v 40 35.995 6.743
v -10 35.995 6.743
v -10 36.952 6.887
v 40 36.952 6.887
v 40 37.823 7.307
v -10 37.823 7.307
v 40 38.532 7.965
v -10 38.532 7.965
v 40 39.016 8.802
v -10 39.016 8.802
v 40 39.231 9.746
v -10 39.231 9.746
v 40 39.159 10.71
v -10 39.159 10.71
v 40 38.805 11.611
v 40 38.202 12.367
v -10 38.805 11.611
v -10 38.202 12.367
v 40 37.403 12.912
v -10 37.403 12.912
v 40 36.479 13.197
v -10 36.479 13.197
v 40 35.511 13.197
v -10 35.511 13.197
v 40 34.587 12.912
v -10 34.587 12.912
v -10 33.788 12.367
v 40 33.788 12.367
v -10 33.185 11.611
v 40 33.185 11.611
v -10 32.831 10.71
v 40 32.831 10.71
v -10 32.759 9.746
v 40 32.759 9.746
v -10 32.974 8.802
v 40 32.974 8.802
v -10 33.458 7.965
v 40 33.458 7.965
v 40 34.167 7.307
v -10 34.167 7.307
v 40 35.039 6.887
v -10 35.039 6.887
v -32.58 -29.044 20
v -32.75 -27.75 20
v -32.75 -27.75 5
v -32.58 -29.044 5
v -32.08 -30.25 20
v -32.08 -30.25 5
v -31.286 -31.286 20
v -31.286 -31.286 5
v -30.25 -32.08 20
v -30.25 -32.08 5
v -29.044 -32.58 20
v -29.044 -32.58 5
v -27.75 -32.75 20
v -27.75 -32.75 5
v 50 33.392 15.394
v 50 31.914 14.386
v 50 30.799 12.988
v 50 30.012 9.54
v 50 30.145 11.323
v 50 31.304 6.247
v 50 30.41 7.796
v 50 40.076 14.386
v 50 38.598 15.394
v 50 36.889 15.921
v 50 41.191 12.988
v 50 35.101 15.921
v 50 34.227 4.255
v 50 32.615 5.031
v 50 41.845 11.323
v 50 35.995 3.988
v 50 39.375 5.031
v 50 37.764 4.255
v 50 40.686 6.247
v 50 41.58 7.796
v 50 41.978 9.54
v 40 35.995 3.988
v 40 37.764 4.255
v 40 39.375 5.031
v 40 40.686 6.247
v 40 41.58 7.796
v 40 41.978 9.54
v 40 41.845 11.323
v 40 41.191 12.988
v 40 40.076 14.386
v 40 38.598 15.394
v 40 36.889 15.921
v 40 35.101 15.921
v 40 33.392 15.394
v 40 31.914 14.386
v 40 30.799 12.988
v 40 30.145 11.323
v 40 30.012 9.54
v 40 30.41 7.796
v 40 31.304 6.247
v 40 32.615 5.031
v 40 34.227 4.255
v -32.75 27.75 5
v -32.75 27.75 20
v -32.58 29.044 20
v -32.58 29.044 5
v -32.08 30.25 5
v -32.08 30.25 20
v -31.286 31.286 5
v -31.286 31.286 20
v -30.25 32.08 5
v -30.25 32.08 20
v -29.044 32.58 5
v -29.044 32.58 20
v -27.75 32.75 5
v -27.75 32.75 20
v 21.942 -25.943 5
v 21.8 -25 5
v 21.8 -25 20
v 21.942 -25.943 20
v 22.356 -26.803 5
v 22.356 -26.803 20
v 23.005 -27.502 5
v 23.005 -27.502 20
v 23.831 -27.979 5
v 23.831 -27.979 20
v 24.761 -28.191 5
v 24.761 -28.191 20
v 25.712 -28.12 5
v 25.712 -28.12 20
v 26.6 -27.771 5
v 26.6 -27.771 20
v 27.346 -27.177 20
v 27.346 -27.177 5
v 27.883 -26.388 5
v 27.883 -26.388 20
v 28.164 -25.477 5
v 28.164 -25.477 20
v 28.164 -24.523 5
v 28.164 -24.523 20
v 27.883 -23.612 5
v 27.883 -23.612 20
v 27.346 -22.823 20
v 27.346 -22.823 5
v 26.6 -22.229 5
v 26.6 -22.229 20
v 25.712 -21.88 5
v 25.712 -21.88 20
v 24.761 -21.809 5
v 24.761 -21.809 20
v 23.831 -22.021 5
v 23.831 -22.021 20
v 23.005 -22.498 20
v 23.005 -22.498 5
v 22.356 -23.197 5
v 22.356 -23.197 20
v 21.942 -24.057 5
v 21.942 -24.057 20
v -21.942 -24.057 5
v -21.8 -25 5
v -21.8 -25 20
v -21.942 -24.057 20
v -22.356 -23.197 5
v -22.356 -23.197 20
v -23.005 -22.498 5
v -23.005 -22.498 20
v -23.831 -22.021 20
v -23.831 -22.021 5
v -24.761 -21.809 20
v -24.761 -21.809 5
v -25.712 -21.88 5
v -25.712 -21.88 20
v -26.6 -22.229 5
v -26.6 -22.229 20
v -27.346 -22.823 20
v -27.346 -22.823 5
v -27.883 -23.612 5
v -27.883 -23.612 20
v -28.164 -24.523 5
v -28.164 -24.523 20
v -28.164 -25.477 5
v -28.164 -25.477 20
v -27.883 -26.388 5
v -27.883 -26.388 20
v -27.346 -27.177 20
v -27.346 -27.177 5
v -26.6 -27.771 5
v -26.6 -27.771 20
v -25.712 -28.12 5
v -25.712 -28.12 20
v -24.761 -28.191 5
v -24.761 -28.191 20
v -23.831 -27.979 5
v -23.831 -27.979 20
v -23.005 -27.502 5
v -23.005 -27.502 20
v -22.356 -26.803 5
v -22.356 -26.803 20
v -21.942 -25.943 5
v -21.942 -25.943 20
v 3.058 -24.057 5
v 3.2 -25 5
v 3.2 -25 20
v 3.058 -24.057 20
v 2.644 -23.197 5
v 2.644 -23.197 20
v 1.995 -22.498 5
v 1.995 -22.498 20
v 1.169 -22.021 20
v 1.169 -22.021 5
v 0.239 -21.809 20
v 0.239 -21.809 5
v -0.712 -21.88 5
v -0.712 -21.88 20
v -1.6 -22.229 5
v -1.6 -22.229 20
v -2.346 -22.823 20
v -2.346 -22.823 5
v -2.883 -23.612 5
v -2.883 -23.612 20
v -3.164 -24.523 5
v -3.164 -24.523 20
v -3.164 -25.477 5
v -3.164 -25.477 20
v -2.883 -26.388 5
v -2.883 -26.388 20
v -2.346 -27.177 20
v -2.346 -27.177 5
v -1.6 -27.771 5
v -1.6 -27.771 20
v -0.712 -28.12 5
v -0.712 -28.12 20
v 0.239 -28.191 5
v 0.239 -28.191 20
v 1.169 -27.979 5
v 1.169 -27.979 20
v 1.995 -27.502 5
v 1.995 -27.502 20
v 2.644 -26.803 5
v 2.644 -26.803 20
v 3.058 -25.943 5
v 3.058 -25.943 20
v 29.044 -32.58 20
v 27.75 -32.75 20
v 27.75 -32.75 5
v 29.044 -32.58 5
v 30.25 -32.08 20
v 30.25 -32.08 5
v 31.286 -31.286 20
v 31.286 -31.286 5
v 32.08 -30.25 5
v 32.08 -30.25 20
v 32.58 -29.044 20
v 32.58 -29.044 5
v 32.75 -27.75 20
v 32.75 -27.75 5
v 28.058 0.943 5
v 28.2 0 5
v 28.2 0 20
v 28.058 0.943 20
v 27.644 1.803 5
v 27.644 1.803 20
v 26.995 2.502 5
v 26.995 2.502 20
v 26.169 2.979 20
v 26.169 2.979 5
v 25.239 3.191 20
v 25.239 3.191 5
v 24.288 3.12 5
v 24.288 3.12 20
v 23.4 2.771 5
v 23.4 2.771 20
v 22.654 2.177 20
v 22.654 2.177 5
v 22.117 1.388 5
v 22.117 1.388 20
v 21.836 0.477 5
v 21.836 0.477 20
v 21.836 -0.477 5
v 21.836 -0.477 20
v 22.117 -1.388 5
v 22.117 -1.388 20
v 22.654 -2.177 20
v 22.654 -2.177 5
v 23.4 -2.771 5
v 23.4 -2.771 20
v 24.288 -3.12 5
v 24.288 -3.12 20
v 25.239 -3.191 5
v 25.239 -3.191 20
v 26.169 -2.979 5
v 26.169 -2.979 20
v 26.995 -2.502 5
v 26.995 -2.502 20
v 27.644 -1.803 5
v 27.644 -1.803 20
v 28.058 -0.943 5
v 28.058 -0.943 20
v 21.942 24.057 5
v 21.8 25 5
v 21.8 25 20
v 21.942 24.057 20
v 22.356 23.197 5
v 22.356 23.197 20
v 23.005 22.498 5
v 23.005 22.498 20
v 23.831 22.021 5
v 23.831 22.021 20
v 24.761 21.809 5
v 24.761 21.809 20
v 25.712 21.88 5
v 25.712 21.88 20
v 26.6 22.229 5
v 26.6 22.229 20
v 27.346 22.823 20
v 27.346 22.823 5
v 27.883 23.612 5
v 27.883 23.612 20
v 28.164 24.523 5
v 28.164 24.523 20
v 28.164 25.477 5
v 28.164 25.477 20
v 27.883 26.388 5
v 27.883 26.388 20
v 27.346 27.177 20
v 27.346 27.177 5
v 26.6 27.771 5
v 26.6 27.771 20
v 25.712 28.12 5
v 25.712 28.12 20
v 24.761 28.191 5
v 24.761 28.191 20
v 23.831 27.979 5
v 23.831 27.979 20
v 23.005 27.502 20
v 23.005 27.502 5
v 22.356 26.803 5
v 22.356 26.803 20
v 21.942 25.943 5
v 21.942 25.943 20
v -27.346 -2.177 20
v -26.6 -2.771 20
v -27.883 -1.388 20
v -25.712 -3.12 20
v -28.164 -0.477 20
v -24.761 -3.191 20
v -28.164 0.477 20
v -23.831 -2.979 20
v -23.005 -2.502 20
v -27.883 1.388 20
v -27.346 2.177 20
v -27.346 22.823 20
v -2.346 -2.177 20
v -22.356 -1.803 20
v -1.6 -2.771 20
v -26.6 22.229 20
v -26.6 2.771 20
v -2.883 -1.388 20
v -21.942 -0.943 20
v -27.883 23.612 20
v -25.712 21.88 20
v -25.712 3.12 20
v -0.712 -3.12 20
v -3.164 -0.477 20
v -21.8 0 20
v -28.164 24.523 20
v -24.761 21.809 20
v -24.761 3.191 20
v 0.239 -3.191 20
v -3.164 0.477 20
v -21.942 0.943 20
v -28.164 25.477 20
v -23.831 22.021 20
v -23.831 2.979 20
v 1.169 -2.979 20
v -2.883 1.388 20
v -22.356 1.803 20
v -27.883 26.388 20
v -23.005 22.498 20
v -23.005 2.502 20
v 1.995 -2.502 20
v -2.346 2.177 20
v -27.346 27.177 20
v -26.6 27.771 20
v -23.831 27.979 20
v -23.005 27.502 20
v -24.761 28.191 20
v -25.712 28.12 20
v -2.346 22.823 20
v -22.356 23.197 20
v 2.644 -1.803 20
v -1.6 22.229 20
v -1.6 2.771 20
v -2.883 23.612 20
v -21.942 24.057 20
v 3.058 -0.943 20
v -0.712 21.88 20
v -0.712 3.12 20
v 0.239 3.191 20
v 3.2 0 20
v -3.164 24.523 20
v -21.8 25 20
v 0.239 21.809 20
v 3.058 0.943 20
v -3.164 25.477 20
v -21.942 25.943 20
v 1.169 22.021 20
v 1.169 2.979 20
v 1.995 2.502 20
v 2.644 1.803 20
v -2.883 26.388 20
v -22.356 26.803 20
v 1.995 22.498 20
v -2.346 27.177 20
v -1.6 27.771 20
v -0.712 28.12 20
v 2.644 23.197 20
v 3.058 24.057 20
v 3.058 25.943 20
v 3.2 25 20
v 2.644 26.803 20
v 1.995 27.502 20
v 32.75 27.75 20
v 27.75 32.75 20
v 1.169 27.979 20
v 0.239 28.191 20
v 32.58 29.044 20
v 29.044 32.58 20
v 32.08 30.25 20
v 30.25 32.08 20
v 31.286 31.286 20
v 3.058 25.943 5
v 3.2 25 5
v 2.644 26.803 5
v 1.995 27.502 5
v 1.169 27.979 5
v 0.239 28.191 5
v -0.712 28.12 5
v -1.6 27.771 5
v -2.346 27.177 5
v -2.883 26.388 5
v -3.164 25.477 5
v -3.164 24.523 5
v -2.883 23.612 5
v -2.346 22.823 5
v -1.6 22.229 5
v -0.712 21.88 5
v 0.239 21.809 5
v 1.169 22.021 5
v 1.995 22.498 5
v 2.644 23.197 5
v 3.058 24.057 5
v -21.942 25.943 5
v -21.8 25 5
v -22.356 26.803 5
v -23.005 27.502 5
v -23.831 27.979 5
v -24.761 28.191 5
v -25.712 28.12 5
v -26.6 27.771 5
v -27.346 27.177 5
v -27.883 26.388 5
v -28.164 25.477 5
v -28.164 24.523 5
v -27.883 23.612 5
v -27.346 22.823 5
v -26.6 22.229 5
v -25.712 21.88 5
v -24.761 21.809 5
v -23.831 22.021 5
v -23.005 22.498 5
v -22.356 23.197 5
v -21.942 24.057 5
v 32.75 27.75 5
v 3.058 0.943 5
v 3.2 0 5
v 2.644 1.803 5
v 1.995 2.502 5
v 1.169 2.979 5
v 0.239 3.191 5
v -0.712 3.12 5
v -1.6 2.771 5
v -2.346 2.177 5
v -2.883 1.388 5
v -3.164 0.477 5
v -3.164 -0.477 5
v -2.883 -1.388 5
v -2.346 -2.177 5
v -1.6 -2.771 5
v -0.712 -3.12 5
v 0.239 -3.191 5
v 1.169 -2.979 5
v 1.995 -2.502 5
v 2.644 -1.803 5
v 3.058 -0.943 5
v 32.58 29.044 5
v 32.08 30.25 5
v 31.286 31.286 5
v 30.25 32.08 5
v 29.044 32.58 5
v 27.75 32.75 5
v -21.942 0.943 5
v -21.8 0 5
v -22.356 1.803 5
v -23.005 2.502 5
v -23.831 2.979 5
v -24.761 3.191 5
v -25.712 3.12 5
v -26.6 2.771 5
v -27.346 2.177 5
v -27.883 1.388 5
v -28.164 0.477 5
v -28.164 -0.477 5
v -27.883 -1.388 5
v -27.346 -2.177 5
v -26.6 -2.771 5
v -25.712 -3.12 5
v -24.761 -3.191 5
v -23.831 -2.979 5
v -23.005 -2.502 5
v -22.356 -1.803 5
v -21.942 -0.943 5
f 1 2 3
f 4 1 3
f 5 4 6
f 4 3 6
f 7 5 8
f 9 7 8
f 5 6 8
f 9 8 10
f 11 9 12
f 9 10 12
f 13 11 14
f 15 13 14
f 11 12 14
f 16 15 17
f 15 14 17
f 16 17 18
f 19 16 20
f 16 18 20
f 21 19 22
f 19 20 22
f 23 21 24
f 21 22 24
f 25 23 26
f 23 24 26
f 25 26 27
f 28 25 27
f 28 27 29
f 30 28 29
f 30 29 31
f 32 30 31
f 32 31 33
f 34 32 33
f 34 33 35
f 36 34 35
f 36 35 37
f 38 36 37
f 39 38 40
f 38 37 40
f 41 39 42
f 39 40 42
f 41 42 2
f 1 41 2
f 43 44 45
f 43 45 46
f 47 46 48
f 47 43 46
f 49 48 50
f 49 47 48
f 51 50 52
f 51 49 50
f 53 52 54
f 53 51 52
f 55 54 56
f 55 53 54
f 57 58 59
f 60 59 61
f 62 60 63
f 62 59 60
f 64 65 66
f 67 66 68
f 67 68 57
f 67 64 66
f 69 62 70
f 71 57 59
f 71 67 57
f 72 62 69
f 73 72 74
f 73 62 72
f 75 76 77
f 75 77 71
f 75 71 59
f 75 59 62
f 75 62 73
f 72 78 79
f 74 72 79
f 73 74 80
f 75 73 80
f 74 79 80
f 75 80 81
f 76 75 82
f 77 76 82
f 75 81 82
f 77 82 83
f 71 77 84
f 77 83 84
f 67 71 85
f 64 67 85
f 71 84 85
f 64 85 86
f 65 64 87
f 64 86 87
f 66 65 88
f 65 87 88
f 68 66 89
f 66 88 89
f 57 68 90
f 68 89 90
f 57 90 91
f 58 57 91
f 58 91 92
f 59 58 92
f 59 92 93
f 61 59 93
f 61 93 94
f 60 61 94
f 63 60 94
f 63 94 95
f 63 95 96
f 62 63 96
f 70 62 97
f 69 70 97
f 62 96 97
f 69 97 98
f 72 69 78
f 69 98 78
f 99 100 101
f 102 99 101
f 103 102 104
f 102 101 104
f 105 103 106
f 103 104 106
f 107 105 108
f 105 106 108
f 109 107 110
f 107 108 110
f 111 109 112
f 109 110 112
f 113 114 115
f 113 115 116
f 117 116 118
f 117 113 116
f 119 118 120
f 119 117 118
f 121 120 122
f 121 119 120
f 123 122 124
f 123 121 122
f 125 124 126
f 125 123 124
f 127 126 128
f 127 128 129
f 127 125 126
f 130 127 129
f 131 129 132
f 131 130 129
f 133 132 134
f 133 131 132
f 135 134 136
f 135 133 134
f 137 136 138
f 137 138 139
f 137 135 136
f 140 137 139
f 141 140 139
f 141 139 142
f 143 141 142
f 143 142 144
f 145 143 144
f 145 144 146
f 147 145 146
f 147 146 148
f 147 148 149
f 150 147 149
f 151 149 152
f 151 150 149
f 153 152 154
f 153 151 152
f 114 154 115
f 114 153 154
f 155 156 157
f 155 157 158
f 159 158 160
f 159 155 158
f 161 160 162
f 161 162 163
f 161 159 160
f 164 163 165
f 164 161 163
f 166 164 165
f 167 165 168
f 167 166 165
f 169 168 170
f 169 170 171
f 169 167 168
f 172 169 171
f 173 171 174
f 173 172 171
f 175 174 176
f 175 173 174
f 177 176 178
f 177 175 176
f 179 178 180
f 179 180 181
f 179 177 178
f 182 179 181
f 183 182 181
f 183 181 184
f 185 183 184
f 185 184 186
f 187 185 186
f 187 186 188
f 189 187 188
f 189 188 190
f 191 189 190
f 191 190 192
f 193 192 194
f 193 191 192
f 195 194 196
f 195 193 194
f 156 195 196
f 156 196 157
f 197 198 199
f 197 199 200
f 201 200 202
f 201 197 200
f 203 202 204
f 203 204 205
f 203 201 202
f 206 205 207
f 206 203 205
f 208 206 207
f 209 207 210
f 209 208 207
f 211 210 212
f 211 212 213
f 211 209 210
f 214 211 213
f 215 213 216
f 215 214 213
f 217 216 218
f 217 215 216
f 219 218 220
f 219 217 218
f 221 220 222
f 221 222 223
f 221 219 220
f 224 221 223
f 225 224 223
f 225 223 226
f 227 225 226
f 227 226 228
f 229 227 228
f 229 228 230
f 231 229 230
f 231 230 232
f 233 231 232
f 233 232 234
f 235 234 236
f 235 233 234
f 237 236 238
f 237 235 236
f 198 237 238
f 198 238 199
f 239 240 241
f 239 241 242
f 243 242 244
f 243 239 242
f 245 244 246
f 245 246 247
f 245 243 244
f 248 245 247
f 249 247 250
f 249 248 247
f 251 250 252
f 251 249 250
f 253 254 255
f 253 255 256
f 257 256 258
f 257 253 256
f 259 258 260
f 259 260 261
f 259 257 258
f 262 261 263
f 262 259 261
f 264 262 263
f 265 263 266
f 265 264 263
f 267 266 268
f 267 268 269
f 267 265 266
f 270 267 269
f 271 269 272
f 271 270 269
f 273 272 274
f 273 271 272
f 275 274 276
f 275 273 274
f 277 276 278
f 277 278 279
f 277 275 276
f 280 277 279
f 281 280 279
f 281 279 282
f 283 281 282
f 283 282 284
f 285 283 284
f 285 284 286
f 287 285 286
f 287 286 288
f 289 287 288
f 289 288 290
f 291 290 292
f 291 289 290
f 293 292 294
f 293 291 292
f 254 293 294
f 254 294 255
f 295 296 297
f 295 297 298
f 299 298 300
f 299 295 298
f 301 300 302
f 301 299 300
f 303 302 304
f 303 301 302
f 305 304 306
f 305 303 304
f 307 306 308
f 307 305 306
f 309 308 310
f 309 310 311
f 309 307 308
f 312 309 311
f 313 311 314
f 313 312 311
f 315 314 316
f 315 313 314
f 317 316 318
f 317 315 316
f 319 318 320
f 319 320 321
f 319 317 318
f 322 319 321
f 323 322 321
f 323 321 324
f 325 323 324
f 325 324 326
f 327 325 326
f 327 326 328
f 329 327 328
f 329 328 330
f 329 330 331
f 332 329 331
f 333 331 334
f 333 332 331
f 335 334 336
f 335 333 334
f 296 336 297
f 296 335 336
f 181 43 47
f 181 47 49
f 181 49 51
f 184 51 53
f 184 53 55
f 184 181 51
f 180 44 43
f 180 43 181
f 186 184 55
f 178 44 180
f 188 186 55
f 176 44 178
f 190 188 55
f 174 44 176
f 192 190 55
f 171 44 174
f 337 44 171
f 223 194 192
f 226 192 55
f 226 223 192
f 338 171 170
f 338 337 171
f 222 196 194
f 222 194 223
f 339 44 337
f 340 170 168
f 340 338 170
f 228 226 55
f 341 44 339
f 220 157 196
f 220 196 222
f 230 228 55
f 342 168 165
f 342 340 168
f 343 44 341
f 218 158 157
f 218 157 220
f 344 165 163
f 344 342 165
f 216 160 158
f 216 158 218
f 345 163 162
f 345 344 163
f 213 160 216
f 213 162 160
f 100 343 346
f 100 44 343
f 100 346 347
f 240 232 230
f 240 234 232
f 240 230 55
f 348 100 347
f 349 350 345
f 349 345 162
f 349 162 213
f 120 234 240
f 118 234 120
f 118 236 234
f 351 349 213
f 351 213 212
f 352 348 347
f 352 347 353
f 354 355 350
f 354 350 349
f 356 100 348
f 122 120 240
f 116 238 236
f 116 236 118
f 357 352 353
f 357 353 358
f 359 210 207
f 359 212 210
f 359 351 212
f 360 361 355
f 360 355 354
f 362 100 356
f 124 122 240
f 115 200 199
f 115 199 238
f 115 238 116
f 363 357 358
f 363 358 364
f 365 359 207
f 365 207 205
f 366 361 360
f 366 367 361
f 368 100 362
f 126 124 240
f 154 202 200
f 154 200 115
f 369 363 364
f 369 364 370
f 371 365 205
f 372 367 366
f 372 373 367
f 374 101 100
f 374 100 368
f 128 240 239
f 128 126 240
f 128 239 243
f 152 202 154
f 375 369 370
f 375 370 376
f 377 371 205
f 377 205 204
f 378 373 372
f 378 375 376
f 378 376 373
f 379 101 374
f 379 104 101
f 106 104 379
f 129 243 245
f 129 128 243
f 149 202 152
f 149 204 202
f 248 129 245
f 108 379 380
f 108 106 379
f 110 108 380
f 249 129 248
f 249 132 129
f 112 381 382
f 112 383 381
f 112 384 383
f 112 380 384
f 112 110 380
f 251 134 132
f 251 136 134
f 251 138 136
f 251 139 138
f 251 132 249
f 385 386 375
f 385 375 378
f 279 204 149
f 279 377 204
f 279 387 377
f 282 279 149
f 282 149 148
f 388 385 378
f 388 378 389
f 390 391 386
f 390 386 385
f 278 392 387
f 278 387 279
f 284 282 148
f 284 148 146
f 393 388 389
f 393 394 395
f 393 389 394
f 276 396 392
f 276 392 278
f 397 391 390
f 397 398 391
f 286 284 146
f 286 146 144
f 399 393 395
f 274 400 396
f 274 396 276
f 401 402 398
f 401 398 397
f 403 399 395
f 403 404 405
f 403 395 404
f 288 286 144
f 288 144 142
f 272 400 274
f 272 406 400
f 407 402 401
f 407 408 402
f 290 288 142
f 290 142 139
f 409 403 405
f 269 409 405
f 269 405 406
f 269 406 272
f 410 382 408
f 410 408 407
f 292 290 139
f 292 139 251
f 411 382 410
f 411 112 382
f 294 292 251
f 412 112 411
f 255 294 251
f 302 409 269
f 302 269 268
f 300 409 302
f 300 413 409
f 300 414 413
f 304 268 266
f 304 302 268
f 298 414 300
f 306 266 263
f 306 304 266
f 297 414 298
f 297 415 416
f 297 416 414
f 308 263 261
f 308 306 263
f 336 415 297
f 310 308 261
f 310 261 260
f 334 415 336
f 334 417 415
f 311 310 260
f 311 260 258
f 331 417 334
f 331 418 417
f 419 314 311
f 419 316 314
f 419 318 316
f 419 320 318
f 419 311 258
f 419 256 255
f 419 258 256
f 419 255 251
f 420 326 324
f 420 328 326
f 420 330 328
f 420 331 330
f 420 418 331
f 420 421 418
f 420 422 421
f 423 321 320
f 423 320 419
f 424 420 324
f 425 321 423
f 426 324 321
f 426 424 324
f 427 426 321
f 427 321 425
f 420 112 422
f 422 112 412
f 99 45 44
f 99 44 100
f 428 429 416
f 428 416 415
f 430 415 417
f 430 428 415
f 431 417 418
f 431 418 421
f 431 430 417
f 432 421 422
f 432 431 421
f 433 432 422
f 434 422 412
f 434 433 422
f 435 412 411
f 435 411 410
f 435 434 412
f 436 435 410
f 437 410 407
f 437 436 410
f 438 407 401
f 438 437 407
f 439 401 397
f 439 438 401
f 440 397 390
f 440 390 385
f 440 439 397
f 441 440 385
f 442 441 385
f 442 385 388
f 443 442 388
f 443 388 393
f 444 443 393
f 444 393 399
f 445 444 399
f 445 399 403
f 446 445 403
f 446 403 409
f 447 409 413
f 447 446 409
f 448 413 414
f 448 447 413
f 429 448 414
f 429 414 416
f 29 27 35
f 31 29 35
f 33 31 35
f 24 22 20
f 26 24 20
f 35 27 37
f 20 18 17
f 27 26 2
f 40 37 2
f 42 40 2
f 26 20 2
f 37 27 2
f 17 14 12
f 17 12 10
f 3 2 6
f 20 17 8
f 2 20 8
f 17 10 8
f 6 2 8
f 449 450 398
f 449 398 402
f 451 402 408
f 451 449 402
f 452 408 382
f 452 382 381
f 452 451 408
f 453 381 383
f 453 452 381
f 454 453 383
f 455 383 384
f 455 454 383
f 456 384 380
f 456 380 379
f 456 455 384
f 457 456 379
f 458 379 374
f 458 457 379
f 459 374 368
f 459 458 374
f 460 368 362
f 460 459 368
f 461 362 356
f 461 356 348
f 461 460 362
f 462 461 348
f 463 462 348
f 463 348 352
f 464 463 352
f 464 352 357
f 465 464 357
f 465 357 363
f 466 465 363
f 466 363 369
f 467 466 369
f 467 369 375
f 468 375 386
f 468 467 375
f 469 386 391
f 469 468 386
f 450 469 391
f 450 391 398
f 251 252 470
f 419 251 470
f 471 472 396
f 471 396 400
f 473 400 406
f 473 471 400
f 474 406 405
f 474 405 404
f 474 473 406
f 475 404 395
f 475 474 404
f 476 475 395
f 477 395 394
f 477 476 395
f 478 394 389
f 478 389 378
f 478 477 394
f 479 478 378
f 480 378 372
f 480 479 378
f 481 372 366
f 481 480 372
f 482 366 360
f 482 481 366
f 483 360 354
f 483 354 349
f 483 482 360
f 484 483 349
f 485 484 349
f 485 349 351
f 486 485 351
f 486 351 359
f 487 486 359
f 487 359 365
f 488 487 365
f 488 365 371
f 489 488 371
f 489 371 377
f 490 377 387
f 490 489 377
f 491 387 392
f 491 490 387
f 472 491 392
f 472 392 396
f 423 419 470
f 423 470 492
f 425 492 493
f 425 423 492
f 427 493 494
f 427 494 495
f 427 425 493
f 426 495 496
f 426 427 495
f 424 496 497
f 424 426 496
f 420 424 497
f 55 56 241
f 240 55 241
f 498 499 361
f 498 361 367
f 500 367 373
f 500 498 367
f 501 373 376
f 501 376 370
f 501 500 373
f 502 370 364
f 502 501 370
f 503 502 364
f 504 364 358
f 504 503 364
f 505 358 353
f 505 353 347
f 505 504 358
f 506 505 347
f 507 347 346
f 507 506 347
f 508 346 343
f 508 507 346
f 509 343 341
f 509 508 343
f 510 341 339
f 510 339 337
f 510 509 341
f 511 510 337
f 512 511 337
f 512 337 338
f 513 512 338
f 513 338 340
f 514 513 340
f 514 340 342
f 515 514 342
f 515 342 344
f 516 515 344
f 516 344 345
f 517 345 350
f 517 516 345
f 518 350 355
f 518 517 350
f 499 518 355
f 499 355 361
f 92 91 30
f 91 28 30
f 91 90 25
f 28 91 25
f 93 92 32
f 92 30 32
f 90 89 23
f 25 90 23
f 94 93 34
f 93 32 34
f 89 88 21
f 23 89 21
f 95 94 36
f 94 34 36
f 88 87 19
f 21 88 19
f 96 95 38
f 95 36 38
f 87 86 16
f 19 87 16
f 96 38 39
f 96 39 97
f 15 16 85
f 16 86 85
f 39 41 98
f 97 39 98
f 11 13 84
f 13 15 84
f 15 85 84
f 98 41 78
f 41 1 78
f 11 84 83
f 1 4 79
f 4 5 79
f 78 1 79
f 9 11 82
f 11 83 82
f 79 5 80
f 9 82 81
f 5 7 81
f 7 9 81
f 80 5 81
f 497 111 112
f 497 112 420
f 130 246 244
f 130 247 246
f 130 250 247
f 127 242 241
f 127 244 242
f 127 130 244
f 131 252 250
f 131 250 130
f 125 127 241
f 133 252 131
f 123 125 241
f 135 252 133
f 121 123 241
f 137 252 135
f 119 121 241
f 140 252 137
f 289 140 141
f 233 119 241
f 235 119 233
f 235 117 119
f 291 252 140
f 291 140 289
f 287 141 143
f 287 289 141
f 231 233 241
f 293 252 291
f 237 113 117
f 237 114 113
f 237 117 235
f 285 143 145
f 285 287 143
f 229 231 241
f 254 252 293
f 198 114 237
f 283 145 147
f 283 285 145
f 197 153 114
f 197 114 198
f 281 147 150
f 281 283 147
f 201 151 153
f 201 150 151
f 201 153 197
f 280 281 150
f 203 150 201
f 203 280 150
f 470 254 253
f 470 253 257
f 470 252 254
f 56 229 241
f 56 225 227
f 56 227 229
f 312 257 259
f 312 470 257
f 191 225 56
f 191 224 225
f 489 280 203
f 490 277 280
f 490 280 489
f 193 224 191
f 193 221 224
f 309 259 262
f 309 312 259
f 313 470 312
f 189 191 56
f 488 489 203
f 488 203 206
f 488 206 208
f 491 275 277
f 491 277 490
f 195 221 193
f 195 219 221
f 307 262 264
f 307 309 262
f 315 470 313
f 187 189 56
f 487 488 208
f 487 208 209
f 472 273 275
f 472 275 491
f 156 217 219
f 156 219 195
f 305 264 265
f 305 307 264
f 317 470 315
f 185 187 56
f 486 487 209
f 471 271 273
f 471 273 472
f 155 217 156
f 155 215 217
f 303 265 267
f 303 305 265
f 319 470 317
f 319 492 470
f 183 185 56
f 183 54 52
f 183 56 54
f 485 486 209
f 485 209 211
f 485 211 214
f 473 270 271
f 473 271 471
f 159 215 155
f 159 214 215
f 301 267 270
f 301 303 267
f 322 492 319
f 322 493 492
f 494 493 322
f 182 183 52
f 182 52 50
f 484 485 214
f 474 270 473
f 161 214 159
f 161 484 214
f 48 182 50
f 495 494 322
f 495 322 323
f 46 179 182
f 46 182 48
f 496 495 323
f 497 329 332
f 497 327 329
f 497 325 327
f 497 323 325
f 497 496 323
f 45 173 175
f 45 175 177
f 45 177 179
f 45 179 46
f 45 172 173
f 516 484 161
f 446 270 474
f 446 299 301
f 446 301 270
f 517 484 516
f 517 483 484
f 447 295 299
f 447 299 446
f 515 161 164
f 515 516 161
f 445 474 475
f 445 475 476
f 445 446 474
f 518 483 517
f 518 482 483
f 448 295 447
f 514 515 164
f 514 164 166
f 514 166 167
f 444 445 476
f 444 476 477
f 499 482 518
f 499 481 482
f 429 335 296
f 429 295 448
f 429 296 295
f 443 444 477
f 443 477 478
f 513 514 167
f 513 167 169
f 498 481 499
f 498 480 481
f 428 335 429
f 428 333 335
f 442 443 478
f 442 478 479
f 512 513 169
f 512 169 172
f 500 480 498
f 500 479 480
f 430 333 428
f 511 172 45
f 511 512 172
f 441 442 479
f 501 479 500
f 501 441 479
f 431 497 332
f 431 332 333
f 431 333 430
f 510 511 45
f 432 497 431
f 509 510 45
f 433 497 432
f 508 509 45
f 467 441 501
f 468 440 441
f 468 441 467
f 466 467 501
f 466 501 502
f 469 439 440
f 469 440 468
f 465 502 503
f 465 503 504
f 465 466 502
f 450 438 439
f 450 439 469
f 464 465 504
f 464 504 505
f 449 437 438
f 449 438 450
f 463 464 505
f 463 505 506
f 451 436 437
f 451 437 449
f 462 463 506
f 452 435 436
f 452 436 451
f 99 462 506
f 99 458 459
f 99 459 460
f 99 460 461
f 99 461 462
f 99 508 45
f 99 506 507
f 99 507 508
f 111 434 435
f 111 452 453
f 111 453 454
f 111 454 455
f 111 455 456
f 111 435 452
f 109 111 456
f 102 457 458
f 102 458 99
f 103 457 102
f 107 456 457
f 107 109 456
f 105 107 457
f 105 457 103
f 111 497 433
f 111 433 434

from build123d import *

# Parameters (mm, degrees)
SKETCH_1_W           = 65.5
SKETCH_1_H           = 65.5
EXTRUDE_1_DEPTH      = 20
FILLET_1_R           = 5
EXTRUDE_2_DEPTH      = 40
EXTRUDE_2_DEPTH_BACK = 10
SKETCH_5_R           = 3.245044742
SKETCH_6_R           = 6
EXTRUDE_3_DEPTH      = 10
SKETCH_7_R           = 3.2
CUT_EXTRUDE_2_DEPTH  = 5
CUT_EXTRUDE_START    = -15
SKETCH_3_R           = 3.2
CUT_EXTRUDE_3_DEPTH  = 15
SKETCH_9_W           = 65.5
SKETCH_9_H           = 65.5
CUT_EXTRUDE_5_DEPTH  = 5


with BuildPart() as part:
    # 스케치1 → 보스-돌출1 (new body)
    with BuildSketch(Plane.XY):
        Rectangle(SKETCH_1_W, SKETCH_1_H)
    extrude(amount=EXTRUDE_1_DEPTH)

    # 필렛1
    fillet_1_edges = [part.edges().sort_by_distance(p)[0] for p in [
        (-32.75, -32.75, 10),
        (32.75, -32.75, 10),
        (32.75, 32.75, 10),
        (-32.75, 32.75, 10),
    ]]
    fillet(fillet_1_edges, radius=FILLET_1_R)

    # 스케치7 → 컷-돌출2 (cut)
    with BuildSketch(Plane(origin=(0, 0, 0), x_dir=(-1, 0, 0), z_dir=(0, 0, -1))):
        with Locations((-25, -25)):
            Circle(SKETCH_7_R)
        with Locations((-25, 25)):
            Circle(SKETCH_7_R)
    extrude(amount=-CUT_EXTRUDE_2_DEPTH, mode=Mode.SUBTRACT)

    # 스케치3 → 컷-돌출3 (cut)
    with BuildSketch(Plane.XY.offset(20).offset(CUT_EXTRUDE_START)):
        with Locations(Location((25, -25, 0), (0, 0, 180))):
            Circle(SKETCH_3_R)
        with Locations(Location((25, 25, 0), (0, 0, 180))):
            Circle(SKETCH_3_R)
        with Locations((25, 0)):
            Circle(SKETCH_3_R)
        with Locations((0, -25)):
            Circle(SKETCH_3_R)
        with Locations((0, 25)):
            Circle(SKETCH_3_R)
        Circle(SKETCH_3_R)
        with Locations((-25, -25)):
            Circle(SKETCH_3_R)
        with Locations((-25, 25)):
            Circle(SKETCH_3_R)
        with Locations((-25, 0)):
            Circle(SKETCH_3_R)
    extrude(amount=CUT_EXTRUDE_3_DEPTH, mode=Mode.SUBTRACT)

    # 스케치9 → 컷-돌출5 (cut)
    with BuildSketch(Plane(origin=(0, 0, 0), x_dir=(-1, 0, 0), z_dir=(0, 0, -1))):
        Rectangle(SKETCH_9_W, SKETCH_9_H)
    extrude(amount=-CUT_EXTRUDE_5_DEPTH, mode=Mode.SUBTRACT)


with BuildPart() as body_2:
    # 스케치5 → 보스-돌출2 (new, two sides: drawn at the far end of the back side and taken through both)
    with BuildSketch(Plane(origin=(0, 0, 0), x_dir=(0, 0, -1), z_dir=(1, 0, 0)).offset(-EXTRUDE_2_DEPTH_BACK)):
        with Locations((-9.988036098, 35.995044742)):
            Circle(SKETCH_5_R)
    extrude(amount=EXTRUDE_2_DEPTH + EXTRUDE_2_DEPTH_BACK)

    # 스케치6 → 보스-돌출3 (add)
    with BuildSketch(Plane(origin=(40, 0, 0), x_dir=(0, 0, -1), z_dir=(1, 0, 0))):
        with Locations((-9.988036098, 35.995044742)):
            Circle(SKETCH_6_R)
    extrude(amount=EXTRUDE_3_DEPTH)


solid = Compound([part.part, body_2.part])
